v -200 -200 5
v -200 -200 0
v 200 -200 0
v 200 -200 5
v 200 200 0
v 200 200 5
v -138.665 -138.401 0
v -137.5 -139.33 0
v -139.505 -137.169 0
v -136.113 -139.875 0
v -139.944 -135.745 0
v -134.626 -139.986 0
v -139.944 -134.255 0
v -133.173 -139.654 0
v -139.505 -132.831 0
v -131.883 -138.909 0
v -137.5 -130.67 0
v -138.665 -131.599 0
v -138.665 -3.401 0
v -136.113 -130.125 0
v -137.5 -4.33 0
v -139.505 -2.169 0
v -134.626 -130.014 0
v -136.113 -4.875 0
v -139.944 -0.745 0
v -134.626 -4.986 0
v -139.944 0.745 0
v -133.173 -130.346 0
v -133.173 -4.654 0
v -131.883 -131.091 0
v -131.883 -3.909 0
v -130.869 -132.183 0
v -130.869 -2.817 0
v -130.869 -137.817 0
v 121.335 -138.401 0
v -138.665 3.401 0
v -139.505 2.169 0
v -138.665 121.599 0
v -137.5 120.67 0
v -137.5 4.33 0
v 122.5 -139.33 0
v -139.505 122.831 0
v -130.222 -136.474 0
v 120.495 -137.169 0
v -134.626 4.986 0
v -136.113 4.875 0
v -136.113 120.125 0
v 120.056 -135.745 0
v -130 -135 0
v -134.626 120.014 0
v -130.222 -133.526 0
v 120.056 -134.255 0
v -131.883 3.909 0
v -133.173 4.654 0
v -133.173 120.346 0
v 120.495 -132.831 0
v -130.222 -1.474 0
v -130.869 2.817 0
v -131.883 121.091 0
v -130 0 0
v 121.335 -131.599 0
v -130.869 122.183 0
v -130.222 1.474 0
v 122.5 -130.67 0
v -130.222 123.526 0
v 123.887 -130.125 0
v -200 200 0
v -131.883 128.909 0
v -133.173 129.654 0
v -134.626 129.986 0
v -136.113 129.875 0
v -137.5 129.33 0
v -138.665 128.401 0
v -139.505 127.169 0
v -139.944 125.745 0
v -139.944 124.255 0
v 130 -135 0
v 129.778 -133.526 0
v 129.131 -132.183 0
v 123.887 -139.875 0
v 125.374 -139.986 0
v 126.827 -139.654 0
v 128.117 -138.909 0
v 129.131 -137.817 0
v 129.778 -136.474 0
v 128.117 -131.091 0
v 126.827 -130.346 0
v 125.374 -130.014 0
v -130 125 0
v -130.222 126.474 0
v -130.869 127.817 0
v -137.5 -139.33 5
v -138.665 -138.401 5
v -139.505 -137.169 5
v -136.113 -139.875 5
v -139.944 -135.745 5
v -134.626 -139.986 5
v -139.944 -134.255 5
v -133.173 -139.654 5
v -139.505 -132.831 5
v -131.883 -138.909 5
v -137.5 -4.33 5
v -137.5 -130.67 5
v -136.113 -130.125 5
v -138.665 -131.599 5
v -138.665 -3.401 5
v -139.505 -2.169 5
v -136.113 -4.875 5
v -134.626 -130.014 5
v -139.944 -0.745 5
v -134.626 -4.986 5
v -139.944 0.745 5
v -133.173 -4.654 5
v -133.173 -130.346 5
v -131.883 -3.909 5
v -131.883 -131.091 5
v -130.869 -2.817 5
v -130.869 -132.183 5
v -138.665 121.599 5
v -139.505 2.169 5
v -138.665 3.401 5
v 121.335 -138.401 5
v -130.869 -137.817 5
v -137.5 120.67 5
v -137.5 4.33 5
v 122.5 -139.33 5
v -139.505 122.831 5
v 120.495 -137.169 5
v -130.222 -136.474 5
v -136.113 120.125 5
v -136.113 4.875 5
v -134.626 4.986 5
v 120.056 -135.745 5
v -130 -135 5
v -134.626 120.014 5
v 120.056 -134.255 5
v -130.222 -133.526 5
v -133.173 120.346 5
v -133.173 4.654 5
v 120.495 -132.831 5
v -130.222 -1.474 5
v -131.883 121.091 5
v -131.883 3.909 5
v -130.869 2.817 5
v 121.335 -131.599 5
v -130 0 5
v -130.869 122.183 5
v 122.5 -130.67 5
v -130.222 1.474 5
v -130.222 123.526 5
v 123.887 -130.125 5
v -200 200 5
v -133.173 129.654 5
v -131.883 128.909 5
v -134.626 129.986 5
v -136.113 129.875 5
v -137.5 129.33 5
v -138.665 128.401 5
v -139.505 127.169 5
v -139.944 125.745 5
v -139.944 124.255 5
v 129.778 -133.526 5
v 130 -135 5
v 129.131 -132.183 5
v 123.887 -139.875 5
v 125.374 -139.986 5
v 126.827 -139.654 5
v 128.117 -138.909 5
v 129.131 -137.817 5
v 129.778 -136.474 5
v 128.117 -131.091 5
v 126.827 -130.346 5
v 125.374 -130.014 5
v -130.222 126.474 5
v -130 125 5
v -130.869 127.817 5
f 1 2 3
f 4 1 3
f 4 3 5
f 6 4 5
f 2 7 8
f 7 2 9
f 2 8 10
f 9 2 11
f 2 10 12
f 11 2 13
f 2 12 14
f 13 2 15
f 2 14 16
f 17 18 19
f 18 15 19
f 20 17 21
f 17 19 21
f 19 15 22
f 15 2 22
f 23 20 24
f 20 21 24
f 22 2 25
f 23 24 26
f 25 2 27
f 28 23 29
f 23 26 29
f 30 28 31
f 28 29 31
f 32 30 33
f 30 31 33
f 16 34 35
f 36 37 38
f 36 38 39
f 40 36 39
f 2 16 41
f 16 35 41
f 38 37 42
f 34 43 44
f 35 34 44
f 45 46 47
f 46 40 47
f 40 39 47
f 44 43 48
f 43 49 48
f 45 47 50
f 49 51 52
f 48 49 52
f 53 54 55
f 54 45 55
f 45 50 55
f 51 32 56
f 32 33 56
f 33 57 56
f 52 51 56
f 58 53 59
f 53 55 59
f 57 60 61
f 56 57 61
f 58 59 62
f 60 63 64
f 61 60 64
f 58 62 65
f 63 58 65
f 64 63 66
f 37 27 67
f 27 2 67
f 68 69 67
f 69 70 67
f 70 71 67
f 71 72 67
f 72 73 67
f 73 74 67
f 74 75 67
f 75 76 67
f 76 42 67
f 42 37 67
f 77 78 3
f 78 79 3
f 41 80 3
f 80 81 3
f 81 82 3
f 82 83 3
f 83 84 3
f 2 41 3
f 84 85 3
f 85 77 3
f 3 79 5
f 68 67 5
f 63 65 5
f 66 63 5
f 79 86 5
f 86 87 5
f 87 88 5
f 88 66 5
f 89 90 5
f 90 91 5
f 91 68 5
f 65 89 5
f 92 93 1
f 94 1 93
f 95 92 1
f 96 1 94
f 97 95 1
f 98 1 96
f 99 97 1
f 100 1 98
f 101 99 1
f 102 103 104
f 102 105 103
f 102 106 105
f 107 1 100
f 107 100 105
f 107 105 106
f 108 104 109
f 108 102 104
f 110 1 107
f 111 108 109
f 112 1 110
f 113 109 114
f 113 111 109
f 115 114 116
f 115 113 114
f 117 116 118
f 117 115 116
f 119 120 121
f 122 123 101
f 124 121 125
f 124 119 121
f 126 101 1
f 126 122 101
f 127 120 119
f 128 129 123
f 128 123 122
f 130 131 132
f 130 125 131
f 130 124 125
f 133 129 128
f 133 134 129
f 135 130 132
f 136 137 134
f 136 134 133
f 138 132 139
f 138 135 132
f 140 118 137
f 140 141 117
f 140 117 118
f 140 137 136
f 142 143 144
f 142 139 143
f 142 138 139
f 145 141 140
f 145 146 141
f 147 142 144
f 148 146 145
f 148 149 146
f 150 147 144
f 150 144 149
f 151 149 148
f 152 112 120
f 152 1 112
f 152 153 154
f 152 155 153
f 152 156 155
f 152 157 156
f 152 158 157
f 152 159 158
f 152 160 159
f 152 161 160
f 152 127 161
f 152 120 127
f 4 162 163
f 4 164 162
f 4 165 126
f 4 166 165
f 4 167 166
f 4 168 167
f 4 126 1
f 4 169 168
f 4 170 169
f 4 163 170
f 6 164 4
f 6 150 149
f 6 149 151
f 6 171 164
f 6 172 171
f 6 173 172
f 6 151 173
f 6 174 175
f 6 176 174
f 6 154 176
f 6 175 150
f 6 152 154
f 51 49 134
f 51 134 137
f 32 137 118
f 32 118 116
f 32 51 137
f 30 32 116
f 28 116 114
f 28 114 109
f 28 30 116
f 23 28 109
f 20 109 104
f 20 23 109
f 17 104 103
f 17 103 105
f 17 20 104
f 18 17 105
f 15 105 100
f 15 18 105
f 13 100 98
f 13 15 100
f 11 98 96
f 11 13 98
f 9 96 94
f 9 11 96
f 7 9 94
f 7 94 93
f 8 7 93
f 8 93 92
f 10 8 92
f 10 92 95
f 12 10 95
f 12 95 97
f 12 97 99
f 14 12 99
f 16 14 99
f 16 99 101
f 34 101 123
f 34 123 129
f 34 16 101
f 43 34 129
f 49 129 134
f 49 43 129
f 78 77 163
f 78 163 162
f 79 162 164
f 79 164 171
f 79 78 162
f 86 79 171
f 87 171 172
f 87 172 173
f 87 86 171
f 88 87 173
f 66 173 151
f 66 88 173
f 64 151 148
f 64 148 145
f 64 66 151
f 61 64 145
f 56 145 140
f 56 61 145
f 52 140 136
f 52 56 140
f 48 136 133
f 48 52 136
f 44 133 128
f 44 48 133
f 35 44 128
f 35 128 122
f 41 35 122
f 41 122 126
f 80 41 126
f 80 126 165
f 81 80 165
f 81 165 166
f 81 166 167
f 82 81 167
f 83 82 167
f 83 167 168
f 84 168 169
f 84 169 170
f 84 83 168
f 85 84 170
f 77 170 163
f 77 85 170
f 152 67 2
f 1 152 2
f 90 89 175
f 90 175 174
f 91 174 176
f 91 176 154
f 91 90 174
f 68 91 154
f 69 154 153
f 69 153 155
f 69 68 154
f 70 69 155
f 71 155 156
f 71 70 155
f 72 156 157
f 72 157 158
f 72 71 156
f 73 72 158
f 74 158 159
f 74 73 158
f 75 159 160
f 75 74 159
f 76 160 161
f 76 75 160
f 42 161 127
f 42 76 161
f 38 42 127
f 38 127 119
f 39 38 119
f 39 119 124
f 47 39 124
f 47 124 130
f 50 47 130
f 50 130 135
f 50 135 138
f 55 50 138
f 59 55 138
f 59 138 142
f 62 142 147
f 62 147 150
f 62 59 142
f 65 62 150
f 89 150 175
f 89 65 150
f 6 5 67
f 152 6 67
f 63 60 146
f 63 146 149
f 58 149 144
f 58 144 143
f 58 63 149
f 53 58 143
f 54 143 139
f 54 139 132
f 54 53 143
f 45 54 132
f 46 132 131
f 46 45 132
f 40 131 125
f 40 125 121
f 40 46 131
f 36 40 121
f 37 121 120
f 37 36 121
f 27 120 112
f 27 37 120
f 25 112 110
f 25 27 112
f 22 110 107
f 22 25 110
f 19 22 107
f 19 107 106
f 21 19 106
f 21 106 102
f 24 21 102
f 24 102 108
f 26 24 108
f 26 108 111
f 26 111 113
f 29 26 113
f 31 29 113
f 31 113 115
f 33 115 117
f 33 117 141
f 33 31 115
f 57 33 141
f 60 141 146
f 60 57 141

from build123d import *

# Parameters (mm, degrees)
F0_R     = 5
F0_W     = 260
F0_H     = 130
F1_DEPTH = 5
F0_W_2   = 130
F0_H_2   = 120
F2_DEPTH = 5


with BuildPart() as f1:
    # F0 (on Top) → F1 (new body)
    with BuildSketch(Plane.XY):
        Polygon((200, 200), (-200, 200), (-200, 190), (60, 190), (60, 180), (190, 180), (190, 60), (190, -200), (200, -200), align=None)
        Polygon((60, 190), (-200, 190), (-200, 60), (60, 60), (60, 180), align=None)
        with Locations((-135, 125)):
            Circle(F0_R, mode=Mode.SUBTRACT)
        with Locations((-70, -5)):
            Rectangle(F0_W, F0_H)
        with Locations((-135, 0)):
            Circle(F0_R, mode=Mode.SUBTRACT)
        Polygon((60, -200), (190, -200), (190, 60), (60, 60), (60, -70), align=None)
        with Locations((125, -135)):
            Circle(F0_R, mode=Mode.SUBTRACT)
        with Locations((-70, -135)):
            Rectangle(F0_W, F0_H)
        with Locations((-135, -135)):
            Circle(F0_R, mode=Mode.SUBTRACT)
    extrude(amount=F1_DEPTH)

    # F0 (on Top) → F2 (join)
    with BuildSketch(Plane.XY):
        with Locations((125, 120)):
            Rectangle(F0_W_2, F0_H_2)
    extrude(amount=F2_DEPTH)


solid = f1.part
